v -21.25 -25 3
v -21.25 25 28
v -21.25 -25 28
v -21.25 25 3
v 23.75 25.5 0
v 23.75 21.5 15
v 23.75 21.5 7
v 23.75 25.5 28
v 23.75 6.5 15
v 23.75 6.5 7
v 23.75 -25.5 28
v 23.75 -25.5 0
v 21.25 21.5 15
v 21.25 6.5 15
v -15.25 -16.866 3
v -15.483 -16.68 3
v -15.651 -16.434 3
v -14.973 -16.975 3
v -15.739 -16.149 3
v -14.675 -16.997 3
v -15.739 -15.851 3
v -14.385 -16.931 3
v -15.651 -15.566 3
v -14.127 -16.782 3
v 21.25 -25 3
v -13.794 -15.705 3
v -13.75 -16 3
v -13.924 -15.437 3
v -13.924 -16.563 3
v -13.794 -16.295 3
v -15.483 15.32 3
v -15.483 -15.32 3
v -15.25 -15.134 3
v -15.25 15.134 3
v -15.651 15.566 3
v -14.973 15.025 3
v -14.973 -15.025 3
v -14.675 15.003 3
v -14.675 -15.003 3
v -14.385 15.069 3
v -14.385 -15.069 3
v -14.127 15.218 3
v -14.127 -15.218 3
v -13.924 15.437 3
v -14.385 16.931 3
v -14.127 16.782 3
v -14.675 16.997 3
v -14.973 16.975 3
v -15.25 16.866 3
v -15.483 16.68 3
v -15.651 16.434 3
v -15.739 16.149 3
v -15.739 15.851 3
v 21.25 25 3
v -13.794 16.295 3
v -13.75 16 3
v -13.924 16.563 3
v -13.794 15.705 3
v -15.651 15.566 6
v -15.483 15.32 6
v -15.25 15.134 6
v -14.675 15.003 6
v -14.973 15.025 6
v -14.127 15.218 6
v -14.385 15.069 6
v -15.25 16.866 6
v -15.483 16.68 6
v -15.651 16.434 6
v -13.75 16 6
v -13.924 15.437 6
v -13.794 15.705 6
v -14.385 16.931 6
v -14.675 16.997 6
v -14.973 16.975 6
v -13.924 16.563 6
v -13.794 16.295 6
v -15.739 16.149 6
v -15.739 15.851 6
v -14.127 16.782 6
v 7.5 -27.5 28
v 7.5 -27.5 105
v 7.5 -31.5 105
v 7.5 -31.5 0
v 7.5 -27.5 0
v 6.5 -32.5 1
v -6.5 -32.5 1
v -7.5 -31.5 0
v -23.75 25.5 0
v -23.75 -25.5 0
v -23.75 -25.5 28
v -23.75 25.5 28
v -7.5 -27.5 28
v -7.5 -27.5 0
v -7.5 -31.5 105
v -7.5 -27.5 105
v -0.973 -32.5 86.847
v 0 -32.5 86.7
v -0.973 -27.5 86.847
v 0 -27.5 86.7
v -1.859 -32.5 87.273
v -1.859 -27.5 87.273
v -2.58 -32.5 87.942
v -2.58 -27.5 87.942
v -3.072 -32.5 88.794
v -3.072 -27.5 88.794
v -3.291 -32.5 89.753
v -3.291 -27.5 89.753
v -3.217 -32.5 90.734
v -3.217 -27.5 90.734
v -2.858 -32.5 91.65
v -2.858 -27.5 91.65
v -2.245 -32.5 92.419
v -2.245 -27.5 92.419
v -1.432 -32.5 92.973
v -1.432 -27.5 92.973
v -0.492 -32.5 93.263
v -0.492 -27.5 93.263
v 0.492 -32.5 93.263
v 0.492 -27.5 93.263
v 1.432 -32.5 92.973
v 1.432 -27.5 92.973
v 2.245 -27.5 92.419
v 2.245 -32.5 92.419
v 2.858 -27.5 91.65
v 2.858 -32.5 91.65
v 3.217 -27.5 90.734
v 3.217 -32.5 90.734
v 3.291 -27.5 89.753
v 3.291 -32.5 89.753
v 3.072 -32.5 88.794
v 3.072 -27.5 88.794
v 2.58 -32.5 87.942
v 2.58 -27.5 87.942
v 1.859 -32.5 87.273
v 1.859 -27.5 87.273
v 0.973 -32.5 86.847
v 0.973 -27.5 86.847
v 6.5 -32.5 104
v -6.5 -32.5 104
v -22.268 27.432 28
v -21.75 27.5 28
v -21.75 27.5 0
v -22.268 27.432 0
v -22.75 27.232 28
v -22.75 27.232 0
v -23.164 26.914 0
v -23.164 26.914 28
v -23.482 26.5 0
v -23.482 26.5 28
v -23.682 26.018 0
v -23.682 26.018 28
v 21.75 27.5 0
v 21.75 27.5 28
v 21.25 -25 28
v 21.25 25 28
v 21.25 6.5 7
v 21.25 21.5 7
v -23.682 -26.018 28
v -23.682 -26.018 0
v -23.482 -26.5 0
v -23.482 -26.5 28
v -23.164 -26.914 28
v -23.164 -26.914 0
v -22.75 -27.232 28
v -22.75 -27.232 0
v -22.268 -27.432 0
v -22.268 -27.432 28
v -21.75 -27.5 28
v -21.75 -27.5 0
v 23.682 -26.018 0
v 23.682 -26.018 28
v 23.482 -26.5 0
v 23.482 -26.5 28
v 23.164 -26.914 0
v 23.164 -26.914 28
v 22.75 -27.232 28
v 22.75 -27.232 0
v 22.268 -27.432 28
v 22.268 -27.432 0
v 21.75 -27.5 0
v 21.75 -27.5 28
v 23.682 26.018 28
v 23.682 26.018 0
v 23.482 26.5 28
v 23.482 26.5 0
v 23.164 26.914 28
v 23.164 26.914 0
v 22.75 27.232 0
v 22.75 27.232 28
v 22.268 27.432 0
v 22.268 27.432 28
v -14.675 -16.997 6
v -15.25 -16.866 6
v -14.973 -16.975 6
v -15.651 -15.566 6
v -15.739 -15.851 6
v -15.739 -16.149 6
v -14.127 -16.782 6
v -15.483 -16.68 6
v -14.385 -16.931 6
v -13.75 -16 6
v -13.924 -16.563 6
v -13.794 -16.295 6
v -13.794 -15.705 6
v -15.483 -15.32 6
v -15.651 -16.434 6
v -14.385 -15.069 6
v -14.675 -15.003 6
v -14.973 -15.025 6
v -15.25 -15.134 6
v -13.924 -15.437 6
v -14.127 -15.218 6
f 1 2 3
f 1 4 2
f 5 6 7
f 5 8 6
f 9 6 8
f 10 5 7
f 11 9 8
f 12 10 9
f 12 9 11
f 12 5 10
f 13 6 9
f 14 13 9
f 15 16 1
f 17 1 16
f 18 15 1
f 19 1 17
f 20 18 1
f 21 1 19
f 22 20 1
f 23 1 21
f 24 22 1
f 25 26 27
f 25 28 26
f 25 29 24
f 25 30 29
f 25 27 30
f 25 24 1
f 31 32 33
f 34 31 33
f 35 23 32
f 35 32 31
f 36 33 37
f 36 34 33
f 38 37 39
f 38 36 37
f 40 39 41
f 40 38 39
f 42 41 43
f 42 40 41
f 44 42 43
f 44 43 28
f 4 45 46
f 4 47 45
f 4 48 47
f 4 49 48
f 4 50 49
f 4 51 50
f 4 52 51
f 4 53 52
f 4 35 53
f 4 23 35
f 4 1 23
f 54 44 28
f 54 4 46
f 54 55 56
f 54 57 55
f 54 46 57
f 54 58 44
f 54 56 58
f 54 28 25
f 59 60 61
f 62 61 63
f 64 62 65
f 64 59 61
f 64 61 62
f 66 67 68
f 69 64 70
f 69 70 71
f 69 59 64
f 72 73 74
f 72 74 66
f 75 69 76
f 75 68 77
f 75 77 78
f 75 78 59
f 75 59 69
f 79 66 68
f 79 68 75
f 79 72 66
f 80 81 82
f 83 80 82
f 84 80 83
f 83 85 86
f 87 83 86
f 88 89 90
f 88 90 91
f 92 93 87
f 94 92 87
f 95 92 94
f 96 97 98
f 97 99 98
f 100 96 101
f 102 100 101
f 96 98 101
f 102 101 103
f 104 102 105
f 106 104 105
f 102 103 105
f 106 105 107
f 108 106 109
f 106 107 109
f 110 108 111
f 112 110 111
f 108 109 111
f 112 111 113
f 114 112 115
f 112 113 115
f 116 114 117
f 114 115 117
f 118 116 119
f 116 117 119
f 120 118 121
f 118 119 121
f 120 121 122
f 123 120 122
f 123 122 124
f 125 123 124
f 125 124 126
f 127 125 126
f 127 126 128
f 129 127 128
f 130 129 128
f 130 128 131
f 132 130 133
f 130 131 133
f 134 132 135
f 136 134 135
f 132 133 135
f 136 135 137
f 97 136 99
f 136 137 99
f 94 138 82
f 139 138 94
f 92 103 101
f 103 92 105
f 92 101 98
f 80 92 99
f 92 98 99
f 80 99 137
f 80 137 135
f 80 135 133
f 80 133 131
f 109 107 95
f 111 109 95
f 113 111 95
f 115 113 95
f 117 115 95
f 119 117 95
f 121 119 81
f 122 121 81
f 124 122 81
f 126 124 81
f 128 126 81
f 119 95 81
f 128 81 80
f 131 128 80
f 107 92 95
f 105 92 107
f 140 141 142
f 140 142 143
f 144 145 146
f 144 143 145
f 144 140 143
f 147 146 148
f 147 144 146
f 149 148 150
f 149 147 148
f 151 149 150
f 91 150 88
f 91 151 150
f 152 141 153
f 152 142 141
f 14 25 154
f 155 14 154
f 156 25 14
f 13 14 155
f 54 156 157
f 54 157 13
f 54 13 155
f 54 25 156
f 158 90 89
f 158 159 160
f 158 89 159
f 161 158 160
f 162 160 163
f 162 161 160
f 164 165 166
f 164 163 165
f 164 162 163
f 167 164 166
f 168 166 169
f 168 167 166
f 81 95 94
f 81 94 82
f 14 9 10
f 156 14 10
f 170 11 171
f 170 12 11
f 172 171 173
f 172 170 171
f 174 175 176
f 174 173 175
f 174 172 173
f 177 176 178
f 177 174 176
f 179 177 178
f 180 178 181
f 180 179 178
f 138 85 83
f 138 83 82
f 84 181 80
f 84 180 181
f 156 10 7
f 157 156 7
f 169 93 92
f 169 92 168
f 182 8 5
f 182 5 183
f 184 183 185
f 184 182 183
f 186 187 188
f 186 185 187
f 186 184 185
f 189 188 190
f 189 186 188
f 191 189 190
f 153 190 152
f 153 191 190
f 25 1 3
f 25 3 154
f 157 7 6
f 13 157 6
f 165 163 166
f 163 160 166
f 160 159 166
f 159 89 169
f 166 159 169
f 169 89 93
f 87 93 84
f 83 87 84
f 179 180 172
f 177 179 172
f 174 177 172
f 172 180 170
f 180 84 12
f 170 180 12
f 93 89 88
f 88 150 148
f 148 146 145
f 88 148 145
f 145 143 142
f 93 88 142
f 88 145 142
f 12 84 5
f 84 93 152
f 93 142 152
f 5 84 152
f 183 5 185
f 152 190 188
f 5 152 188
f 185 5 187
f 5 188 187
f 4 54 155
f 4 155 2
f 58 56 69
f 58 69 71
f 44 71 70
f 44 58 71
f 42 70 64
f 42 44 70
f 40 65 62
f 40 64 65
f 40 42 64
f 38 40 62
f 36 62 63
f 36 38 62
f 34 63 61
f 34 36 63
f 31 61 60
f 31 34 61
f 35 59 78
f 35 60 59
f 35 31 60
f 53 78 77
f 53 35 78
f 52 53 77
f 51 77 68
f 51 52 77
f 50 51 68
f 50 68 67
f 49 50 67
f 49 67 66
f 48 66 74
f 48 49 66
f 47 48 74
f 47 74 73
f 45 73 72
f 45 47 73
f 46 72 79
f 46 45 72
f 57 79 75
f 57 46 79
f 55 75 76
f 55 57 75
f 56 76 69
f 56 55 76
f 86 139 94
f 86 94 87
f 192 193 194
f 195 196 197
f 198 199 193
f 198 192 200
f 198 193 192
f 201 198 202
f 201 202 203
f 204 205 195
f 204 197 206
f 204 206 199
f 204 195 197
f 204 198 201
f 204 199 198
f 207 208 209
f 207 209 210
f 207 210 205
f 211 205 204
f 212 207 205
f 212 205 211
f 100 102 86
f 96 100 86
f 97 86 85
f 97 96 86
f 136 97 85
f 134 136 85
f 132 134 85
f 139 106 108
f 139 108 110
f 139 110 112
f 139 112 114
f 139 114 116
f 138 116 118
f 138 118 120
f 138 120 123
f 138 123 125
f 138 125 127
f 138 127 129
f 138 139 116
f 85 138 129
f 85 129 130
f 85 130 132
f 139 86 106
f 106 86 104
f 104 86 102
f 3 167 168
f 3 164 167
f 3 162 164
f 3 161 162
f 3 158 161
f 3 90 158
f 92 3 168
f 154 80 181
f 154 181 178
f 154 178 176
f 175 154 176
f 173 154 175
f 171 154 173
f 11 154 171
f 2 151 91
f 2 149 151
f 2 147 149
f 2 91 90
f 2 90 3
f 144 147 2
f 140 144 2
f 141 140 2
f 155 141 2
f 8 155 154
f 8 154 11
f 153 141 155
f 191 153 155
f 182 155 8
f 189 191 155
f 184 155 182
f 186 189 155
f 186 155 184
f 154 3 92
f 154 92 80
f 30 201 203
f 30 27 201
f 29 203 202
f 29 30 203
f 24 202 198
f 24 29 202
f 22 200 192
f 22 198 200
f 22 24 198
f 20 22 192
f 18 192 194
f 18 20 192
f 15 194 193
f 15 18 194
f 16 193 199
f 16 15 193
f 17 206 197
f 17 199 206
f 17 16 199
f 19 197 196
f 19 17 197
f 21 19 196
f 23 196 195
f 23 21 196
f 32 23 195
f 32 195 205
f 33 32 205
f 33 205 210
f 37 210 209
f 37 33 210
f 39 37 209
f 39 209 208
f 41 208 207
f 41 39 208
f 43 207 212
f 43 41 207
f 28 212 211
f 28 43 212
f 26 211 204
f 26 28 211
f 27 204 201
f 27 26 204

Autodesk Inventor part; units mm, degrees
ref_plane "YZ Plane" through (0, 0, 0) normal (1, 0, 0) x (0, 1, 0)
ref_plane "XZ Plane" through (0, 0, 0) normal (0, 1, 0) x (-1, 0, 0)
ref_plane "XY Plane" through (0, 0, 0) normal (0, 0, 1) x (1, 0, 0)
sketch "Náčrt1" plane through (0, 0, 0) normal (0, 0, 1) x (1, 0, 0)
  line L0 (-21.25, 25) -> (21.25, 25)
  line L1 (21.25, 25) -> (21.25, -25)
  line L2 (21.25, -25) -> (-21.25, -25)
  line L3 (-21.25, -25) -> (-21.25, 25)
  line L4 (0, 35) -> (0, -35) projected
  line L5 (-29.75, 0) -> (29.75, 0) projected
  point P0 (0, 0)
  dimension "d0" = 50
  dimension "d1" = 42.5
extrude "Vysunutí1" add sketch "Náčrt1" along normal blind 3
sketch "Náčrt2" plane through (0, 0, 3) normal (0, 0, 1) x (1, 0, 0)
  line L0 (0, 35) -> (0, -35) projected
  line L1 (-29.75, 0) -> (29.75, 0) projected
  line L2 (21.25, -25) -> (21.25, 25) projected
  line L3 (21.25, 25) -> (-21.25, 25) projected
  line L4 (-21.25, 25) -> (-21.25, -25) projected
  line L5 (-21.25, -25) -> (21.25, -25) projected
  line L6 (-17.5, 21.5) -> (17.5, 21.5) construction
  line L7 (17.5, 21.5) -> (17.5, -21.5) construction
  line L8 (17.5, -21.5) -> (-17.5, -21.5) construction
  line L9 (-17.5, -21.5) -> (-17.5, 21.5) construction
  circle A0 centre (-14.75, 16) radius 1
  circle A1 centre (-14.75, -16) radius 1
  point P0 (0, 0)
  dimension "d4" = 35
  dimension "d5" = 43
  dimension "d6" = 2
  dimension "d9" = 16
  dimension "d10" = 36
extrude "Vysunutí2" add sketch "Náčrt2" along normal blind 3 contours A0 | A1
sketch "Náčrt3" plane through (0, 0, 3) normal (0, 0, 1) x (1, 0, 0)
  circle A0 centre (-14.75, -16) radius 1 projected
  circle A1 centre (-14.75, 16) radius 1 projected
  line L0 (21.25, -25) -> (21.25, 25) projected
  line L1 (21.25, 25) -> (-21.25, 25) projected
  line L2 (-21.25, 25) -> (-21.25, -25) projected
  line L3 (-21.25, -25) -> (21.25, -25) projected
  line L4 (0, 35) -> (0, -35) projected
  line L5 (-29.75, 0) -> (29.75, 0) projected
  line L6 (-23.75, 27.5) -> (23.75, 27.5)
  line L7 (23.75, 27.5) -> (23.75, -27.5)
  line L8 (23.75, -27.5) -> (-23.75, -27.5)
  line L9 (-23.75, -27.5) -> (-23.75, 27.5)
  line L10 (-21.25, 25) -> (21.25, 25)
  line L11 (21.25, 25) -> (21.25, -25)
  line L12 (21.25, -25) -> (-21.25, -25)
  line L13 (-21.25, -25) -> (-21.25, 25)
  point P0 (0, 0)
  dimension "d13" = 2.5
extrude "Vysunutí3" add sketch "Náčrt3" along normal blind 25 and the other way blind 3 contours L0 L5 L7 L8 L4 L3 | L0 L1 L4 L6 L7 L5 | L4 L8 L9 L5 L2 L3 | L1 L2 L5 L9 L6 L4
sketch "Náčrt4" plane through (23.75, -27.5, 28) normal (1, 0, 0) x (0, 0, -1)
  line L0 (13, 34) -> (21, 34)
  line L1 (21, 34) -> (21, 49)
  line L2 (21, 49) -> (13, 49)
  line L3 (13, 49) -> (13, 34)
  line L4 (0, 55) -> (28, 55) projected
  line L5 (0, 0) -> (0, 55) projected
  line L6 (28, 0) -> (0, 0) projected
  line L7 (28, 55) -> (28, 0) projected
  line L8 (-6.6, 27.5) -> (39.6, 27.5) projected
  line L9 (28, -11) -> (28, 66) projected
  line L10 (25, 2.5) -> (25, 52.5) projected
  line L11 (0, 52.5) -> (25, 52.5) projected
  point P0 (28, 27.5)
  dimension "d18" = 15
  dimension "d19" = 8
  dimension "d20" = 7
  dimension "d21" = 6
extrude "Vysunutí4" cut sketch "Náčrt4" against normal up to surface (2.5 mm away) contours L3 L2 L1 L0
sketch "Náčrt5" plane through (-23.75, -27.5, 28) normal (0, -1, 0) x (1, 0, 0)
  line L0 (47.5, -28) -> (47.5, 0) projected
  line L1 (0, 0) -> (47.5, 0) projected
  line L2 (0, -28) -> (0, 0) projected
  line L3 (47.5, -28) -> (0, -28) projected
  line L4 (23.75, 99) -> (23.75, -55) projected
  line L5 (-9.5, -28) -> (57, -28) projected
  line L6 (31.25, -28) -> (16.25, -28)
  line L7 (16.25, -28) -> (16.25, 77)
  line L8 (16.25, 77) -> (31.25, 77)
  line L9 (31.25, 77) -> (31.25, -28)
  point P0 (23.75, -28)
  point P1 (31.25, -28)
  dimension "d24" = 15
  dimension "d25" = 77
extrude "Vysunutí5" add sketch "Náčrt5" along normal blind 5 contours L3 L4 L1 L9 | L1 L4 L8 L9 | L3 L7 L1 L4 | L1 L7 L8 L4
sketch "Náčrt6" plane through (-23.75, -32.5, 28) normal (0, -1, 0) x (1, 0, 0)
  line L0 (16.25, 77) -> (16.25, -28) projected
  line L1 (16.25, -28) -> (31.25, -28) projected
  line L2 (31.25, -28) -> (31.25, 77) projected
  line L3 (31.25, 77) -> (16.25, 77) projected
  line L4 (23.75, 99) -> (23.75, -55) projected
  line L5 (-9.5, -28) -> (57, -28) projected
  point P0 (23.75, -28)
  point P1 (23.75, 62)
  dimension "d28" = 15
hole "Díra1" at (0, -32.5, 90) direction (0, 1, 0) diameter 6.6 end through all
chamfer "Zkosení1" distance 1 angle 45 4 edges at (-7.5, -32.5, 52.5) (7.5, -32.5, 52.5) (0, -32.5, 105) (0, -32.5, 0)
fillet "Zaoblení1" radius 2 4 edges at (-23.75, -27.5, 14) (23.75, -27.5, 14) (23.75, 27.5, 14) (-23.75, 27.5, 14)
properties part number "a4988_box_3D tisk"
